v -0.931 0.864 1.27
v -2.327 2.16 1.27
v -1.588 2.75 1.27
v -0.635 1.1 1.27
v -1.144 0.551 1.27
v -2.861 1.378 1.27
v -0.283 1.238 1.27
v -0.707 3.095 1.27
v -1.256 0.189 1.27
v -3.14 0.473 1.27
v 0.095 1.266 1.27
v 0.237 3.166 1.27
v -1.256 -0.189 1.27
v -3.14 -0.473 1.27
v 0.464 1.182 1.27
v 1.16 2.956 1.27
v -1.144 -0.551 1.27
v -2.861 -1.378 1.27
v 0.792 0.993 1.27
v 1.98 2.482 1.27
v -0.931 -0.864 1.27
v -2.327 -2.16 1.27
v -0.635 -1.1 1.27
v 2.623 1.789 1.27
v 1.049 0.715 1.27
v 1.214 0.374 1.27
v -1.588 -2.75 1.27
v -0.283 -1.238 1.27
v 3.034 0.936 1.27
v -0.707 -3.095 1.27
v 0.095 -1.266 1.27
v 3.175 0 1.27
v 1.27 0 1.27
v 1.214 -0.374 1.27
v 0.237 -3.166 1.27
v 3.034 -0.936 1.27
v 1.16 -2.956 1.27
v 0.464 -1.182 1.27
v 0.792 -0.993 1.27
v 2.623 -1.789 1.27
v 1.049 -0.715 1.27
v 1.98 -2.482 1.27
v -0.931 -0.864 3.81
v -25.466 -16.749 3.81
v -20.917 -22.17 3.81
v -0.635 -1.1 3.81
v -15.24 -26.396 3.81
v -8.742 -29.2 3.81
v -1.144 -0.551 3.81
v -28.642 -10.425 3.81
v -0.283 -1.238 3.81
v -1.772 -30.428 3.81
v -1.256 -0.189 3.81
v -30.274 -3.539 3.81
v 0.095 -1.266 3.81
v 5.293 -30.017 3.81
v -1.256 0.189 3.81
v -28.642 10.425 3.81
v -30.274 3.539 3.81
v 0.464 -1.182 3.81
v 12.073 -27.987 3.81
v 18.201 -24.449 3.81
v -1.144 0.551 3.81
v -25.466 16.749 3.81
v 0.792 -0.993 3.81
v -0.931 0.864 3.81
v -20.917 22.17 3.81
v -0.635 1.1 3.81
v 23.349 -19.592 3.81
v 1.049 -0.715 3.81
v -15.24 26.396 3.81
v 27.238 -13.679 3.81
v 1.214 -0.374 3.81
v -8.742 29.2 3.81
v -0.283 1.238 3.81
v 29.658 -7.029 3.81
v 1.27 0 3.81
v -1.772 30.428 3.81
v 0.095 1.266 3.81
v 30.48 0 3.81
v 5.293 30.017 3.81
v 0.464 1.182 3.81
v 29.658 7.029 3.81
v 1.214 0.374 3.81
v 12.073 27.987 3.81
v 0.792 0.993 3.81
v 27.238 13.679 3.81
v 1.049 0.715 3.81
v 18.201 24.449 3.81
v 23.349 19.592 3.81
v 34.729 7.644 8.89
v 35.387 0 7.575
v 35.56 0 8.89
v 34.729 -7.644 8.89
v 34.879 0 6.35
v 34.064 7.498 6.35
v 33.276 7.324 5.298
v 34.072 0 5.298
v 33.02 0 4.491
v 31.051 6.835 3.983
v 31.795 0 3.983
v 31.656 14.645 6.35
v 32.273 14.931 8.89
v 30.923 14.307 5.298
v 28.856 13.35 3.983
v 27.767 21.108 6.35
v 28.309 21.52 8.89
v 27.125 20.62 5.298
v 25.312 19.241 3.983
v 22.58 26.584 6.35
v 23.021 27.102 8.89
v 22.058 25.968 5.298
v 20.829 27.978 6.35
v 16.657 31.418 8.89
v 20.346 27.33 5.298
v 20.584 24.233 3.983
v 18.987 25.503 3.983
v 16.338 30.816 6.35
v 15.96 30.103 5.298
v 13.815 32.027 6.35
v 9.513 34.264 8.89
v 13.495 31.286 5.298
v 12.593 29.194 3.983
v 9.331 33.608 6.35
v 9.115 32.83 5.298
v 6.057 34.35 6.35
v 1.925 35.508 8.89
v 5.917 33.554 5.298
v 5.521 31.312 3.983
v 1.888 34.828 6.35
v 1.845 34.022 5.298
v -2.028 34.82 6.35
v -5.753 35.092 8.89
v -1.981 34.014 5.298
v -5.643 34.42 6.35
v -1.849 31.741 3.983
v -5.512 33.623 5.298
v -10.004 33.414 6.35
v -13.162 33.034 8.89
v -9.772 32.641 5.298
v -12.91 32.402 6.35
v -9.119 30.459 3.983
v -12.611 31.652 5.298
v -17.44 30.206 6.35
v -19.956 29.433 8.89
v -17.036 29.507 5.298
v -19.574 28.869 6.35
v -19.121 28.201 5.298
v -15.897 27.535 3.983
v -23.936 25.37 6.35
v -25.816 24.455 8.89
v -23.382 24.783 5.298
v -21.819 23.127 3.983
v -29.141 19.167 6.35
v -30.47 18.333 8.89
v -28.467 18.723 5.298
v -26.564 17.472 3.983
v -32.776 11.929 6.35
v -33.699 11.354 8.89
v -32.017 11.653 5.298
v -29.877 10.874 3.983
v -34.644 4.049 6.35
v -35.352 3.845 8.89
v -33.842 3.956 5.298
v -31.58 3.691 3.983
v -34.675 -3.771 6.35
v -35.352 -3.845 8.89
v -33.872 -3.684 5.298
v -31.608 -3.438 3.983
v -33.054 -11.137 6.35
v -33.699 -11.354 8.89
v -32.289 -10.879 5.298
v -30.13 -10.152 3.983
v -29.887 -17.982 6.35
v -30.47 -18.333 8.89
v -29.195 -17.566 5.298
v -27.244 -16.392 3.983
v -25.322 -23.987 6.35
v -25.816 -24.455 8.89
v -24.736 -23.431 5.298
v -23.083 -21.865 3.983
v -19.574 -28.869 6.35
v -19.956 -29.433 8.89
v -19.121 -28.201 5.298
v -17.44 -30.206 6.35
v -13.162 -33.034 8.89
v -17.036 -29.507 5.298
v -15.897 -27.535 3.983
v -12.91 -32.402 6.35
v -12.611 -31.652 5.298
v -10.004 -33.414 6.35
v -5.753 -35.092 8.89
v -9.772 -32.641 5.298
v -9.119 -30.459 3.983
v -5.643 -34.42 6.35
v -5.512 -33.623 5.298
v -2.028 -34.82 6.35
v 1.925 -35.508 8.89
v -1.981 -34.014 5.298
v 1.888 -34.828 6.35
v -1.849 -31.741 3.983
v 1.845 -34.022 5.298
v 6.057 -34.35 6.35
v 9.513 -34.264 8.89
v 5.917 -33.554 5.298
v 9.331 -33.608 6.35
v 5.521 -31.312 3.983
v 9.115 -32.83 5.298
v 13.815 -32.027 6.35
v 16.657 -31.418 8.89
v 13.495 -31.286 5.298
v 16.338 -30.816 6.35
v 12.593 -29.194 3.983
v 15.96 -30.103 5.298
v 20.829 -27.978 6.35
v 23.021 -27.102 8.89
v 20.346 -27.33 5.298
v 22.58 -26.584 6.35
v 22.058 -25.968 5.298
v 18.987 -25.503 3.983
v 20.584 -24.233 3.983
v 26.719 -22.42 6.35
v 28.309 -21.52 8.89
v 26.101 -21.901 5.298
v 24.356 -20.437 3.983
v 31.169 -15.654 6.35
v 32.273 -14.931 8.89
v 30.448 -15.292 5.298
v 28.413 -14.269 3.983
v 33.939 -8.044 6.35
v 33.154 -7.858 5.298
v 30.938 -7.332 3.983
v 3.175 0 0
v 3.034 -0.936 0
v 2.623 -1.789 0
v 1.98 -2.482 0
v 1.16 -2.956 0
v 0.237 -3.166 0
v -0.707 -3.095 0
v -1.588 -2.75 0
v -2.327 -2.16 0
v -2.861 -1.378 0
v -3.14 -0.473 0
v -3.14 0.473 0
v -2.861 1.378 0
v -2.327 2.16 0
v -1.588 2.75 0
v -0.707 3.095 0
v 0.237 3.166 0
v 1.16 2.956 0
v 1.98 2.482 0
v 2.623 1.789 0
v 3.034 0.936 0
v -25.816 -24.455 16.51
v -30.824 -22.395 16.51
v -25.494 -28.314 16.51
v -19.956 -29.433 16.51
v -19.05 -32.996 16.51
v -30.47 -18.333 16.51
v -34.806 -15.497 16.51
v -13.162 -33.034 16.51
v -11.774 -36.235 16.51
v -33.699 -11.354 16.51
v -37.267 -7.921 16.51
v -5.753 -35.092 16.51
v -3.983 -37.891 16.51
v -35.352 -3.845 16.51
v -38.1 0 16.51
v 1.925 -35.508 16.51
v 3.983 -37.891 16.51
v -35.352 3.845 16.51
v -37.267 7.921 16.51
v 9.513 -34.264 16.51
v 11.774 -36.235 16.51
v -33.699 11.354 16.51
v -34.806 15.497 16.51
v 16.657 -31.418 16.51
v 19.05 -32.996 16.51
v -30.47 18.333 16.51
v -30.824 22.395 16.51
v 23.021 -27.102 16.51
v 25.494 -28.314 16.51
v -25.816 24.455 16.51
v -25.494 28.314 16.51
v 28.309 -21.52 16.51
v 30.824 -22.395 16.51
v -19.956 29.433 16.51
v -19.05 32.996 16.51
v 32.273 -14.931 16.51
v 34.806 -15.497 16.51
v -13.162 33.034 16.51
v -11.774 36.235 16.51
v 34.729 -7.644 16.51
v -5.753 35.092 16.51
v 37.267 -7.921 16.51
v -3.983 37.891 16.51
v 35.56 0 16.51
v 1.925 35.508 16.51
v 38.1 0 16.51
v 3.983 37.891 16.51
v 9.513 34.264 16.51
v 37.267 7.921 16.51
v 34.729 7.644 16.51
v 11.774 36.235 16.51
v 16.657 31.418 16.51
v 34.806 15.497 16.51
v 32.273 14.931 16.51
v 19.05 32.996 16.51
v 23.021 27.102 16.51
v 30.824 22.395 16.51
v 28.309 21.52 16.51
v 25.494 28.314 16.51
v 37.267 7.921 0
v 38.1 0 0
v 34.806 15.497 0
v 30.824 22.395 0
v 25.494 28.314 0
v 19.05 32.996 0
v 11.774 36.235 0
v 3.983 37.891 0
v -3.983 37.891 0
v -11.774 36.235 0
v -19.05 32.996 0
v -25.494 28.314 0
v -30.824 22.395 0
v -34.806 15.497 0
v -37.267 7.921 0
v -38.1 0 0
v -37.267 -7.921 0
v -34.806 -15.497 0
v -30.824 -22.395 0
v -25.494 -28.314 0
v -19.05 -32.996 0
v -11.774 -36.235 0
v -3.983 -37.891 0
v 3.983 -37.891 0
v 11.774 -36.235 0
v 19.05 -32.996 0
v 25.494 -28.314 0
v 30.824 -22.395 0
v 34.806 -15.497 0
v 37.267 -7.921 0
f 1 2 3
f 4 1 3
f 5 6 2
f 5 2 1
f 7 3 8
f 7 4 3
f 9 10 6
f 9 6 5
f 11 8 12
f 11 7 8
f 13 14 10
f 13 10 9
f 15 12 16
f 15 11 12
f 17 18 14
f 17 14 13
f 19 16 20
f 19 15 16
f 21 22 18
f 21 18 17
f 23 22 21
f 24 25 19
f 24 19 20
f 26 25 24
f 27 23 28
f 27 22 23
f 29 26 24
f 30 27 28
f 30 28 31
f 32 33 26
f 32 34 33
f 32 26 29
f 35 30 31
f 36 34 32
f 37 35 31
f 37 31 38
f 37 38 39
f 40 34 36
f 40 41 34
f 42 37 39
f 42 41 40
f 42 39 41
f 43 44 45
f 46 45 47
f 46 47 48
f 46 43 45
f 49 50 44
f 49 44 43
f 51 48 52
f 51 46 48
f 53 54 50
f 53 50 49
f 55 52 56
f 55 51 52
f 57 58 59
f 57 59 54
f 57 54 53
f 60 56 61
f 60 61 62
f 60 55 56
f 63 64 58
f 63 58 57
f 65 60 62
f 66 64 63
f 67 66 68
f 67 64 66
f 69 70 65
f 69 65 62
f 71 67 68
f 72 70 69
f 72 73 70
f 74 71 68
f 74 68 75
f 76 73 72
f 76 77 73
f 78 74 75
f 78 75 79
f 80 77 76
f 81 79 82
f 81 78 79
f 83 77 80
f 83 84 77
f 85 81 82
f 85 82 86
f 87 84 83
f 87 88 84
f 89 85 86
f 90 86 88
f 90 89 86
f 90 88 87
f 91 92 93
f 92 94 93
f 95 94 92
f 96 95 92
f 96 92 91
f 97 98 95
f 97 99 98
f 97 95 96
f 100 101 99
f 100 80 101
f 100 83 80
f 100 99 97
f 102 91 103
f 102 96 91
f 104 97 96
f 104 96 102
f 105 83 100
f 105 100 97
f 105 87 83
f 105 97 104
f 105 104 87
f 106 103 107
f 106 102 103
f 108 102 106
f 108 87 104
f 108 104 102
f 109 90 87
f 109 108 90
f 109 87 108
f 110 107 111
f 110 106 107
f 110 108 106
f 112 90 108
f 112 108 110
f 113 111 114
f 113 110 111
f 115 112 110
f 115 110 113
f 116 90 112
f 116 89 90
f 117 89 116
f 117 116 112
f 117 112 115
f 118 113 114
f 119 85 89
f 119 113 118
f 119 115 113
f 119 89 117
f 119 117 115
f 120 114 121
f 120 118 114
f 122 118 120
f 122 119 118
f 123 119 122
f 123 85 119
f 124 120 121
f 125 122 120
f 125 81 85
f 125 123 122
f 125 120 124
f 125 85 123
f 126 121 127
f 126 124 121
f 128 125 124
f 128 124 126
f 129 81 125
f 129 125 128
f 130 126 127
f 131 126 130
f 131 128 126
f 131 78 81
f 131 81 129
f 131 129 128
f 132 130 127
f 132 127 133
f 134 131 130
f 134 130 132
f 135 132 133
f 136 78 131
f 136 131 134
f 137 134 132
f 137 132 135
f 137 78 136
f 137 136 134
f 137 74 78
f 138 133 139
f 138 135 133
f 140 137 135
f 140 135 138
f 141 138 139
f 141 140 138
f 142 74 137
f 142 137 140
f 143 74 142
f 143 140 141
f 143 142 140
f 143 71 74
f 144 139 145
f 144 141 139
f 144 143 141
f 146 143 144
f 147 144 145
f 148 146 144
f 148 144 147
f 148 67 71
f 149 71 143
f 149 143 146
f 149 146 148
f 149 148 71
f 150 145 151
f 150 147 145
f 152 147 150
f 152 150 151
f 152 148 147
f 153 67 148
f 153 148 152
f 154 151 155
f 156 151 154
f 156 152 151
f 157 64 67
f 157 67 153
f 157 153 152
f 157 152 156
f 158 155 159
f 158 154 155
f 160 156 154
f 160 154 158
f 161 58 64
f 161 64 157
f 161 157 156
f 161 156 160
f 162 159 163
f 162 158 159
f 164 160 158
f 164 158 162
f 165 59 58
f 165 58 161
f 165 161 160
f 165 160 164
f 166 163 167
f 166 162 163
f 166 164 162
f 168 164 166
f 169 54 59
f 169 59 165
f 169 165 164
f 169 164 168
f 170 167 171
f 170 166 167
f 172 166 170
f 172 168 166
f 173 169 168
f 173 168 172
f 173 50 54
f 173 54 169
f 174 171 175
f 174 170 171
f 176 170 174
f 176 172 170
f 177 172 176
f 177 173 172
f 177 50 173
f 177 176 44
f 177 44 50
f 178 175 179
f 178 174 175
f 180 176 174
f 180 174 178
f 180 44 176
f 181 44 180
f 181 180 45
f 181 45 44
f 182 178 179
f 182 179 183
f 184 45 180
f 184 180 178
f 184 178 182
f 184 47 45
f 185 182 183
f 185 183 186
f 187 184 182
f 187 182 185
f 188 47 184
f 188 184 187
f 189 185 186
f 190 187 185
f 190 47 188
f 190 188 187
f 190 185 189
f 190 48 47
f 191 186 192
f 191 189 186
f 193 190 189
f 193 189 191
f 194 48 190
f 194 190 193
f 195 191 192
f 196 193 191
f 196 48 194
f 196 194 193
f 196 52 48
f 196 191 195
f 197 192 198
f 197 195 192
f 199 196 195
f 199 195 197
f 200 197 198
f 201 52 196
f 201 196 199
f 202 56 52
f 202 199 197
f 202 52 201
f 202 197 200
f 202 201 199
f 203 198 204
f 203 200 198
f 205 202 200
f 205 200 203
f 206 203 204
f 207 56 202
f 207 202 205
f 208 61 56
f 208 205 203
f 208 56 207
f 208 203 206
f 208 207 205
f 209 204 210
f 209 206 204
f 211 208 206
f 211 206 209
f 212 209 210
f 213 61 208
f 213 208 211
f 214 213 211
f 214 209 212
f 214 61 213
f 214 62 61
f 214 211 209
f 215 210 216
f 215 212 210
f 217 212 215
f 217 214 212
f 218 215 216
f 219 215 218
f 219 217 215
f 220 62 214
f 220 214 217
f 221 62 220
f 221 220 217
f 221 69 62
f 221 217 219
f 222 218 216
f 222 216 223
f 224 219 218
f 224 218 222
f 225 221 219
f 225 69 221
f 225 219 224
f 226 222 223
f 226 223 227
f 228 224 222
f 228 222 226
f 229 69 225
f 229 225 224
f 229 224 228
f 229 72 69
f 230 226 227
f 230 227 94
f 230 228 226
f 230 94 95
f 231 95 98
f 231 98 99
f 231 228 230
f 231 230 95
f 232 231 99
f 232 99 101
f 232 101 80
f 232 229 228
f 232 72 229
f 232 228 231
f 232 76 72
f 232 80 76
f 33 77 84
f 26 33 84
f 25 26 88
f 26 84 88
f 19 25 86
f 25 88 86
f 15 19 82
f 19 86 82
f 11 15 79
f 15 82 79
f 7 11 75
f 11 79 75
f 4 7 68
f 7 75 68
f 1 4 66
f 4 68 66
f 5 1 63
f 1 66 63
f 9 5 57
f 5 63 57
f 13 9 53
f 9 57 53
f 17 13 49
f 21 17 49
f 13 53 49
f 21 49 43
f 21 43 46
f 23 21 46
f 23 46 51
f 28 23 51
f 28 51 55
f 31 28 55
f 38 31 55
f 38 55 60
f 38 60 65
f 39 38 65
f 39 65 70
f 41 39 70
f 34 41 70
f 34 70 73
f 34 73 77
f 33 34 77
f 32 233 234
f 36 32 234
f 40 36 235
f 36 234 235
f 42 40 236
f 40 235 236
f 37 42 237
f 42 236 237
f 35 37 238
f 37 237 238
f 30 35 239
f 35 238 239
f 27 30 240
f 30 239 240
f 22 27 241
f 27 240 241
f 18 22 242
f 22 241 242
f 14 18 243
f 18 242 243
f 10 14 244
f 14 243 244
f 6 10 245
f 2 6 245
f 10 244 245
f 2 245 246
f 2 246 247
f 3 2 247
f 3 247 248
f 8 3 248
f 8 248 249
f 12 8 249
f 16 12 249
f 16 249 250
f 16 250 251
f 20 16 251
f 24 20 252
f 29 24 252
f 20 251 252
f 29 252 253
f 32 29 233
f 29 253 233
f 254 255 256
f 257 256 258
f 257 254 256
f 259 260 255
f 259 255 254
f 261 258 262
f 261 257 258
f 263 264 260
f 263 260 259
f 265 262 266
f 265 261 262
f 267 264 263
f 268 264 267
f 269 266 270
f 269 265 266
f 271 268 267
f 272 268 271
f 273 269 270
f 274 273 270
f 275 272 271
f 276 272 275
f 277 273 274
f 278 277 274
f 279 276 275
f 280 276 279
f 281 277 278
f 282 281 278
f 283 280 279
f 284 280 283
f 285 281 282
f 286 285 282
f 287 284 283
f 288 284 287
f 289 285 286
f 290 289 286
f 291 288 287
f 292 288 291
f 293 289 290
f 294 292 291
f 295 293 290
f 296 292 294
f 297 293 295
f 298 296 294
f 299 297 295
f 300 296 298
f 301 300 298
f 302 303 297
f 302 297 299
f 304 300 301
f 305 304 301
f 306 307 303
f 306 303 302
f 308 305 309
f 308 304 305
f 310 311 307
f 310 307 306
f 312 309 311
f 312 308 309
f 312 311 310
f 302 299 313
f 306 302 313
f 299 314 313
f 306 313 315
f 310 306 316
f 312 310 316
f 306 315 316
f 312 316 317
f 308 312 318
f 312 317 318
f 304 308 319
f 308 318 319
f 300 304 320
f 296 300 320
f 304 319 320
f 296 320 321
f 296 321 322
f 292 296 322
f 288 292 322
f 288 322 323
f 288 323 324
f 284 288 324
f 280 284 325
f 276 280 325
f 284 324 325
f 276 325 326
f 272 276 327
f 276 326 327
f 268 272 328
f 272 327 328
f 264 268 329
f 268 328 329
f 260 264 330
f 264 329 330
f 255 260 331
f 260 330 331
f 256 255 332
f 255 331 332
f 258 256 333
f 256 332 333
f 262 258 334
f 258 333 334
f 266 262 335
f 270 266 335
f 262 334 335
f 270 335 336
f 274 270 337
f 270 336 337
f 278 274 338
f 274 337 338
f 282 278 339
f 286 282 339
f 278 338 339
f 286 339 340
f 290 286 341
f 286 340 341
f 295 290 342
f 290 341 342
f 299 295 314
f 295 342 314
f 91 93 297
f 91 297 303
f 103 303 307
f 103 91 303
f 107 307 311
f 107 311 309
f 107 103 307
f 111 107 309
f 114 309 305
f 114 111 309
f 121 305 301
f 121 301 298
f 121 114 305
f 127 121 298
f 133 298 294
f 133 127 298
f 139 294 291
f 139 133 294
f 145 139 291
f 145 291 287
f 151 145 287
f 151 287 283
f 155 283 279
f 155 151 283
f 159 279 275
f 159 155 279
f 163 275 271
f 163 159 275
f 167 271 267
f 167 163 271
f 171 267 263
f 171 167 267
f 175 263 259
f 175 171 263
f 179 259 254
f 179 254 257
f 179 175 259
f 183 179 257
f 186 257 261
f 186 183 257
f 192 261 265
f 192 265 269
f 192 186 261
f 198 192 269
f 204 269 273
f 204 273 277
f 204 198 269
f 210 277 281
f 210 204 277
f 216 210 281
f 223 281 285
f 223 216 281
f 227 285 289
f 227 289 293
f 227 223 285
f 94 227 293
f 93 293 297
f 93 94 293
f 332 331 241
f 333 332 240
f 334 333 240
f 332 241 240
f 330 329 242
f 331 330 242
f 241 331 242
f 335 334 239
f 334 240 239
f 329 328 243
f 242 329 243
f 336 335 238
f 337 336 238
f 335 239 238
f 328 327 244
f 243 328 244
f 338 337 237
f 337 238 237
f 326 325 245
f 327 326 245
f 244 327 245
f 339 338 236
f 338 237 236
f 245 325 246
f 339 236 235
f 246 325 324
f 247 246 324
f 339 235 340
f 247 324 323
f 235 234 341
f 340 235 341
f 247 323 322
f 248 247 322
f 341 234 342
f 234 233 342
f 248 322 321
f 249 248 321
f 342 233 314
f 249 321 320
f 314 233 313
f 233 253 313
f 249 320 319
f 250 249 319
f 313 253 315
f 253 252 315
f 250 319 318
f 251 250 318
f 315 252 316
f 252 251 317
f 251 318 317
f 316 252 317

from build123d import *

# Parameters (mm, degrees)
F0_R     = 38.1
F1_DEPTH = 3.81
F2_R     = 38.1
F2_R_2   = 35.56
F3_DEPTH = 12.7
F4_R     = 5.08
F5_R     = 1.27
F6_DEPTH = 25.4
F7_R     = 3.175
F8_DEPTH = 1.27


with BuildPart() as f1:
    # F0 (on Top) → F1 (new body)
    with BuildSketch(Plane.XY):
        Circle(F0_R)
    extrude(amount=F1_DEPTH)

    # F2 (on face) → F3 (join)
    with BuildSketch(Plane.XY.offset(3.81)):
        Circle(F2_R)
        Circle(F2_R_2, mode=Mode.SUBTRACT)
    extrude(amount=F3_DEPTH)

    # F4
    f4_edges = [f1.edges().sort_by_distance(p)[0] for p in [
        (-35.56, 0, 3.81),
    ]]
    fillet(f4_edges, radius=F4_R)

    # F5 (on face) → F6 (cut)
    with BuildSketch(Plane.XY.offset(3.81)):
        Circle(F5_R)
    extrude(amount=-F6_DEPTH, mode=Mode.SUBTRACT)

    # F7 (on face) → F8 (cut)
    with BuildSketch(Plane(origin=(0, 0, 0), x_dir=(1, 0, 0), z_dir=(0, 0, -1))):
        Circle(F7_R)
    extrude(amount=-F8_DEPTH, mode=Mode.SUBTRACT)


solid = f1.part
